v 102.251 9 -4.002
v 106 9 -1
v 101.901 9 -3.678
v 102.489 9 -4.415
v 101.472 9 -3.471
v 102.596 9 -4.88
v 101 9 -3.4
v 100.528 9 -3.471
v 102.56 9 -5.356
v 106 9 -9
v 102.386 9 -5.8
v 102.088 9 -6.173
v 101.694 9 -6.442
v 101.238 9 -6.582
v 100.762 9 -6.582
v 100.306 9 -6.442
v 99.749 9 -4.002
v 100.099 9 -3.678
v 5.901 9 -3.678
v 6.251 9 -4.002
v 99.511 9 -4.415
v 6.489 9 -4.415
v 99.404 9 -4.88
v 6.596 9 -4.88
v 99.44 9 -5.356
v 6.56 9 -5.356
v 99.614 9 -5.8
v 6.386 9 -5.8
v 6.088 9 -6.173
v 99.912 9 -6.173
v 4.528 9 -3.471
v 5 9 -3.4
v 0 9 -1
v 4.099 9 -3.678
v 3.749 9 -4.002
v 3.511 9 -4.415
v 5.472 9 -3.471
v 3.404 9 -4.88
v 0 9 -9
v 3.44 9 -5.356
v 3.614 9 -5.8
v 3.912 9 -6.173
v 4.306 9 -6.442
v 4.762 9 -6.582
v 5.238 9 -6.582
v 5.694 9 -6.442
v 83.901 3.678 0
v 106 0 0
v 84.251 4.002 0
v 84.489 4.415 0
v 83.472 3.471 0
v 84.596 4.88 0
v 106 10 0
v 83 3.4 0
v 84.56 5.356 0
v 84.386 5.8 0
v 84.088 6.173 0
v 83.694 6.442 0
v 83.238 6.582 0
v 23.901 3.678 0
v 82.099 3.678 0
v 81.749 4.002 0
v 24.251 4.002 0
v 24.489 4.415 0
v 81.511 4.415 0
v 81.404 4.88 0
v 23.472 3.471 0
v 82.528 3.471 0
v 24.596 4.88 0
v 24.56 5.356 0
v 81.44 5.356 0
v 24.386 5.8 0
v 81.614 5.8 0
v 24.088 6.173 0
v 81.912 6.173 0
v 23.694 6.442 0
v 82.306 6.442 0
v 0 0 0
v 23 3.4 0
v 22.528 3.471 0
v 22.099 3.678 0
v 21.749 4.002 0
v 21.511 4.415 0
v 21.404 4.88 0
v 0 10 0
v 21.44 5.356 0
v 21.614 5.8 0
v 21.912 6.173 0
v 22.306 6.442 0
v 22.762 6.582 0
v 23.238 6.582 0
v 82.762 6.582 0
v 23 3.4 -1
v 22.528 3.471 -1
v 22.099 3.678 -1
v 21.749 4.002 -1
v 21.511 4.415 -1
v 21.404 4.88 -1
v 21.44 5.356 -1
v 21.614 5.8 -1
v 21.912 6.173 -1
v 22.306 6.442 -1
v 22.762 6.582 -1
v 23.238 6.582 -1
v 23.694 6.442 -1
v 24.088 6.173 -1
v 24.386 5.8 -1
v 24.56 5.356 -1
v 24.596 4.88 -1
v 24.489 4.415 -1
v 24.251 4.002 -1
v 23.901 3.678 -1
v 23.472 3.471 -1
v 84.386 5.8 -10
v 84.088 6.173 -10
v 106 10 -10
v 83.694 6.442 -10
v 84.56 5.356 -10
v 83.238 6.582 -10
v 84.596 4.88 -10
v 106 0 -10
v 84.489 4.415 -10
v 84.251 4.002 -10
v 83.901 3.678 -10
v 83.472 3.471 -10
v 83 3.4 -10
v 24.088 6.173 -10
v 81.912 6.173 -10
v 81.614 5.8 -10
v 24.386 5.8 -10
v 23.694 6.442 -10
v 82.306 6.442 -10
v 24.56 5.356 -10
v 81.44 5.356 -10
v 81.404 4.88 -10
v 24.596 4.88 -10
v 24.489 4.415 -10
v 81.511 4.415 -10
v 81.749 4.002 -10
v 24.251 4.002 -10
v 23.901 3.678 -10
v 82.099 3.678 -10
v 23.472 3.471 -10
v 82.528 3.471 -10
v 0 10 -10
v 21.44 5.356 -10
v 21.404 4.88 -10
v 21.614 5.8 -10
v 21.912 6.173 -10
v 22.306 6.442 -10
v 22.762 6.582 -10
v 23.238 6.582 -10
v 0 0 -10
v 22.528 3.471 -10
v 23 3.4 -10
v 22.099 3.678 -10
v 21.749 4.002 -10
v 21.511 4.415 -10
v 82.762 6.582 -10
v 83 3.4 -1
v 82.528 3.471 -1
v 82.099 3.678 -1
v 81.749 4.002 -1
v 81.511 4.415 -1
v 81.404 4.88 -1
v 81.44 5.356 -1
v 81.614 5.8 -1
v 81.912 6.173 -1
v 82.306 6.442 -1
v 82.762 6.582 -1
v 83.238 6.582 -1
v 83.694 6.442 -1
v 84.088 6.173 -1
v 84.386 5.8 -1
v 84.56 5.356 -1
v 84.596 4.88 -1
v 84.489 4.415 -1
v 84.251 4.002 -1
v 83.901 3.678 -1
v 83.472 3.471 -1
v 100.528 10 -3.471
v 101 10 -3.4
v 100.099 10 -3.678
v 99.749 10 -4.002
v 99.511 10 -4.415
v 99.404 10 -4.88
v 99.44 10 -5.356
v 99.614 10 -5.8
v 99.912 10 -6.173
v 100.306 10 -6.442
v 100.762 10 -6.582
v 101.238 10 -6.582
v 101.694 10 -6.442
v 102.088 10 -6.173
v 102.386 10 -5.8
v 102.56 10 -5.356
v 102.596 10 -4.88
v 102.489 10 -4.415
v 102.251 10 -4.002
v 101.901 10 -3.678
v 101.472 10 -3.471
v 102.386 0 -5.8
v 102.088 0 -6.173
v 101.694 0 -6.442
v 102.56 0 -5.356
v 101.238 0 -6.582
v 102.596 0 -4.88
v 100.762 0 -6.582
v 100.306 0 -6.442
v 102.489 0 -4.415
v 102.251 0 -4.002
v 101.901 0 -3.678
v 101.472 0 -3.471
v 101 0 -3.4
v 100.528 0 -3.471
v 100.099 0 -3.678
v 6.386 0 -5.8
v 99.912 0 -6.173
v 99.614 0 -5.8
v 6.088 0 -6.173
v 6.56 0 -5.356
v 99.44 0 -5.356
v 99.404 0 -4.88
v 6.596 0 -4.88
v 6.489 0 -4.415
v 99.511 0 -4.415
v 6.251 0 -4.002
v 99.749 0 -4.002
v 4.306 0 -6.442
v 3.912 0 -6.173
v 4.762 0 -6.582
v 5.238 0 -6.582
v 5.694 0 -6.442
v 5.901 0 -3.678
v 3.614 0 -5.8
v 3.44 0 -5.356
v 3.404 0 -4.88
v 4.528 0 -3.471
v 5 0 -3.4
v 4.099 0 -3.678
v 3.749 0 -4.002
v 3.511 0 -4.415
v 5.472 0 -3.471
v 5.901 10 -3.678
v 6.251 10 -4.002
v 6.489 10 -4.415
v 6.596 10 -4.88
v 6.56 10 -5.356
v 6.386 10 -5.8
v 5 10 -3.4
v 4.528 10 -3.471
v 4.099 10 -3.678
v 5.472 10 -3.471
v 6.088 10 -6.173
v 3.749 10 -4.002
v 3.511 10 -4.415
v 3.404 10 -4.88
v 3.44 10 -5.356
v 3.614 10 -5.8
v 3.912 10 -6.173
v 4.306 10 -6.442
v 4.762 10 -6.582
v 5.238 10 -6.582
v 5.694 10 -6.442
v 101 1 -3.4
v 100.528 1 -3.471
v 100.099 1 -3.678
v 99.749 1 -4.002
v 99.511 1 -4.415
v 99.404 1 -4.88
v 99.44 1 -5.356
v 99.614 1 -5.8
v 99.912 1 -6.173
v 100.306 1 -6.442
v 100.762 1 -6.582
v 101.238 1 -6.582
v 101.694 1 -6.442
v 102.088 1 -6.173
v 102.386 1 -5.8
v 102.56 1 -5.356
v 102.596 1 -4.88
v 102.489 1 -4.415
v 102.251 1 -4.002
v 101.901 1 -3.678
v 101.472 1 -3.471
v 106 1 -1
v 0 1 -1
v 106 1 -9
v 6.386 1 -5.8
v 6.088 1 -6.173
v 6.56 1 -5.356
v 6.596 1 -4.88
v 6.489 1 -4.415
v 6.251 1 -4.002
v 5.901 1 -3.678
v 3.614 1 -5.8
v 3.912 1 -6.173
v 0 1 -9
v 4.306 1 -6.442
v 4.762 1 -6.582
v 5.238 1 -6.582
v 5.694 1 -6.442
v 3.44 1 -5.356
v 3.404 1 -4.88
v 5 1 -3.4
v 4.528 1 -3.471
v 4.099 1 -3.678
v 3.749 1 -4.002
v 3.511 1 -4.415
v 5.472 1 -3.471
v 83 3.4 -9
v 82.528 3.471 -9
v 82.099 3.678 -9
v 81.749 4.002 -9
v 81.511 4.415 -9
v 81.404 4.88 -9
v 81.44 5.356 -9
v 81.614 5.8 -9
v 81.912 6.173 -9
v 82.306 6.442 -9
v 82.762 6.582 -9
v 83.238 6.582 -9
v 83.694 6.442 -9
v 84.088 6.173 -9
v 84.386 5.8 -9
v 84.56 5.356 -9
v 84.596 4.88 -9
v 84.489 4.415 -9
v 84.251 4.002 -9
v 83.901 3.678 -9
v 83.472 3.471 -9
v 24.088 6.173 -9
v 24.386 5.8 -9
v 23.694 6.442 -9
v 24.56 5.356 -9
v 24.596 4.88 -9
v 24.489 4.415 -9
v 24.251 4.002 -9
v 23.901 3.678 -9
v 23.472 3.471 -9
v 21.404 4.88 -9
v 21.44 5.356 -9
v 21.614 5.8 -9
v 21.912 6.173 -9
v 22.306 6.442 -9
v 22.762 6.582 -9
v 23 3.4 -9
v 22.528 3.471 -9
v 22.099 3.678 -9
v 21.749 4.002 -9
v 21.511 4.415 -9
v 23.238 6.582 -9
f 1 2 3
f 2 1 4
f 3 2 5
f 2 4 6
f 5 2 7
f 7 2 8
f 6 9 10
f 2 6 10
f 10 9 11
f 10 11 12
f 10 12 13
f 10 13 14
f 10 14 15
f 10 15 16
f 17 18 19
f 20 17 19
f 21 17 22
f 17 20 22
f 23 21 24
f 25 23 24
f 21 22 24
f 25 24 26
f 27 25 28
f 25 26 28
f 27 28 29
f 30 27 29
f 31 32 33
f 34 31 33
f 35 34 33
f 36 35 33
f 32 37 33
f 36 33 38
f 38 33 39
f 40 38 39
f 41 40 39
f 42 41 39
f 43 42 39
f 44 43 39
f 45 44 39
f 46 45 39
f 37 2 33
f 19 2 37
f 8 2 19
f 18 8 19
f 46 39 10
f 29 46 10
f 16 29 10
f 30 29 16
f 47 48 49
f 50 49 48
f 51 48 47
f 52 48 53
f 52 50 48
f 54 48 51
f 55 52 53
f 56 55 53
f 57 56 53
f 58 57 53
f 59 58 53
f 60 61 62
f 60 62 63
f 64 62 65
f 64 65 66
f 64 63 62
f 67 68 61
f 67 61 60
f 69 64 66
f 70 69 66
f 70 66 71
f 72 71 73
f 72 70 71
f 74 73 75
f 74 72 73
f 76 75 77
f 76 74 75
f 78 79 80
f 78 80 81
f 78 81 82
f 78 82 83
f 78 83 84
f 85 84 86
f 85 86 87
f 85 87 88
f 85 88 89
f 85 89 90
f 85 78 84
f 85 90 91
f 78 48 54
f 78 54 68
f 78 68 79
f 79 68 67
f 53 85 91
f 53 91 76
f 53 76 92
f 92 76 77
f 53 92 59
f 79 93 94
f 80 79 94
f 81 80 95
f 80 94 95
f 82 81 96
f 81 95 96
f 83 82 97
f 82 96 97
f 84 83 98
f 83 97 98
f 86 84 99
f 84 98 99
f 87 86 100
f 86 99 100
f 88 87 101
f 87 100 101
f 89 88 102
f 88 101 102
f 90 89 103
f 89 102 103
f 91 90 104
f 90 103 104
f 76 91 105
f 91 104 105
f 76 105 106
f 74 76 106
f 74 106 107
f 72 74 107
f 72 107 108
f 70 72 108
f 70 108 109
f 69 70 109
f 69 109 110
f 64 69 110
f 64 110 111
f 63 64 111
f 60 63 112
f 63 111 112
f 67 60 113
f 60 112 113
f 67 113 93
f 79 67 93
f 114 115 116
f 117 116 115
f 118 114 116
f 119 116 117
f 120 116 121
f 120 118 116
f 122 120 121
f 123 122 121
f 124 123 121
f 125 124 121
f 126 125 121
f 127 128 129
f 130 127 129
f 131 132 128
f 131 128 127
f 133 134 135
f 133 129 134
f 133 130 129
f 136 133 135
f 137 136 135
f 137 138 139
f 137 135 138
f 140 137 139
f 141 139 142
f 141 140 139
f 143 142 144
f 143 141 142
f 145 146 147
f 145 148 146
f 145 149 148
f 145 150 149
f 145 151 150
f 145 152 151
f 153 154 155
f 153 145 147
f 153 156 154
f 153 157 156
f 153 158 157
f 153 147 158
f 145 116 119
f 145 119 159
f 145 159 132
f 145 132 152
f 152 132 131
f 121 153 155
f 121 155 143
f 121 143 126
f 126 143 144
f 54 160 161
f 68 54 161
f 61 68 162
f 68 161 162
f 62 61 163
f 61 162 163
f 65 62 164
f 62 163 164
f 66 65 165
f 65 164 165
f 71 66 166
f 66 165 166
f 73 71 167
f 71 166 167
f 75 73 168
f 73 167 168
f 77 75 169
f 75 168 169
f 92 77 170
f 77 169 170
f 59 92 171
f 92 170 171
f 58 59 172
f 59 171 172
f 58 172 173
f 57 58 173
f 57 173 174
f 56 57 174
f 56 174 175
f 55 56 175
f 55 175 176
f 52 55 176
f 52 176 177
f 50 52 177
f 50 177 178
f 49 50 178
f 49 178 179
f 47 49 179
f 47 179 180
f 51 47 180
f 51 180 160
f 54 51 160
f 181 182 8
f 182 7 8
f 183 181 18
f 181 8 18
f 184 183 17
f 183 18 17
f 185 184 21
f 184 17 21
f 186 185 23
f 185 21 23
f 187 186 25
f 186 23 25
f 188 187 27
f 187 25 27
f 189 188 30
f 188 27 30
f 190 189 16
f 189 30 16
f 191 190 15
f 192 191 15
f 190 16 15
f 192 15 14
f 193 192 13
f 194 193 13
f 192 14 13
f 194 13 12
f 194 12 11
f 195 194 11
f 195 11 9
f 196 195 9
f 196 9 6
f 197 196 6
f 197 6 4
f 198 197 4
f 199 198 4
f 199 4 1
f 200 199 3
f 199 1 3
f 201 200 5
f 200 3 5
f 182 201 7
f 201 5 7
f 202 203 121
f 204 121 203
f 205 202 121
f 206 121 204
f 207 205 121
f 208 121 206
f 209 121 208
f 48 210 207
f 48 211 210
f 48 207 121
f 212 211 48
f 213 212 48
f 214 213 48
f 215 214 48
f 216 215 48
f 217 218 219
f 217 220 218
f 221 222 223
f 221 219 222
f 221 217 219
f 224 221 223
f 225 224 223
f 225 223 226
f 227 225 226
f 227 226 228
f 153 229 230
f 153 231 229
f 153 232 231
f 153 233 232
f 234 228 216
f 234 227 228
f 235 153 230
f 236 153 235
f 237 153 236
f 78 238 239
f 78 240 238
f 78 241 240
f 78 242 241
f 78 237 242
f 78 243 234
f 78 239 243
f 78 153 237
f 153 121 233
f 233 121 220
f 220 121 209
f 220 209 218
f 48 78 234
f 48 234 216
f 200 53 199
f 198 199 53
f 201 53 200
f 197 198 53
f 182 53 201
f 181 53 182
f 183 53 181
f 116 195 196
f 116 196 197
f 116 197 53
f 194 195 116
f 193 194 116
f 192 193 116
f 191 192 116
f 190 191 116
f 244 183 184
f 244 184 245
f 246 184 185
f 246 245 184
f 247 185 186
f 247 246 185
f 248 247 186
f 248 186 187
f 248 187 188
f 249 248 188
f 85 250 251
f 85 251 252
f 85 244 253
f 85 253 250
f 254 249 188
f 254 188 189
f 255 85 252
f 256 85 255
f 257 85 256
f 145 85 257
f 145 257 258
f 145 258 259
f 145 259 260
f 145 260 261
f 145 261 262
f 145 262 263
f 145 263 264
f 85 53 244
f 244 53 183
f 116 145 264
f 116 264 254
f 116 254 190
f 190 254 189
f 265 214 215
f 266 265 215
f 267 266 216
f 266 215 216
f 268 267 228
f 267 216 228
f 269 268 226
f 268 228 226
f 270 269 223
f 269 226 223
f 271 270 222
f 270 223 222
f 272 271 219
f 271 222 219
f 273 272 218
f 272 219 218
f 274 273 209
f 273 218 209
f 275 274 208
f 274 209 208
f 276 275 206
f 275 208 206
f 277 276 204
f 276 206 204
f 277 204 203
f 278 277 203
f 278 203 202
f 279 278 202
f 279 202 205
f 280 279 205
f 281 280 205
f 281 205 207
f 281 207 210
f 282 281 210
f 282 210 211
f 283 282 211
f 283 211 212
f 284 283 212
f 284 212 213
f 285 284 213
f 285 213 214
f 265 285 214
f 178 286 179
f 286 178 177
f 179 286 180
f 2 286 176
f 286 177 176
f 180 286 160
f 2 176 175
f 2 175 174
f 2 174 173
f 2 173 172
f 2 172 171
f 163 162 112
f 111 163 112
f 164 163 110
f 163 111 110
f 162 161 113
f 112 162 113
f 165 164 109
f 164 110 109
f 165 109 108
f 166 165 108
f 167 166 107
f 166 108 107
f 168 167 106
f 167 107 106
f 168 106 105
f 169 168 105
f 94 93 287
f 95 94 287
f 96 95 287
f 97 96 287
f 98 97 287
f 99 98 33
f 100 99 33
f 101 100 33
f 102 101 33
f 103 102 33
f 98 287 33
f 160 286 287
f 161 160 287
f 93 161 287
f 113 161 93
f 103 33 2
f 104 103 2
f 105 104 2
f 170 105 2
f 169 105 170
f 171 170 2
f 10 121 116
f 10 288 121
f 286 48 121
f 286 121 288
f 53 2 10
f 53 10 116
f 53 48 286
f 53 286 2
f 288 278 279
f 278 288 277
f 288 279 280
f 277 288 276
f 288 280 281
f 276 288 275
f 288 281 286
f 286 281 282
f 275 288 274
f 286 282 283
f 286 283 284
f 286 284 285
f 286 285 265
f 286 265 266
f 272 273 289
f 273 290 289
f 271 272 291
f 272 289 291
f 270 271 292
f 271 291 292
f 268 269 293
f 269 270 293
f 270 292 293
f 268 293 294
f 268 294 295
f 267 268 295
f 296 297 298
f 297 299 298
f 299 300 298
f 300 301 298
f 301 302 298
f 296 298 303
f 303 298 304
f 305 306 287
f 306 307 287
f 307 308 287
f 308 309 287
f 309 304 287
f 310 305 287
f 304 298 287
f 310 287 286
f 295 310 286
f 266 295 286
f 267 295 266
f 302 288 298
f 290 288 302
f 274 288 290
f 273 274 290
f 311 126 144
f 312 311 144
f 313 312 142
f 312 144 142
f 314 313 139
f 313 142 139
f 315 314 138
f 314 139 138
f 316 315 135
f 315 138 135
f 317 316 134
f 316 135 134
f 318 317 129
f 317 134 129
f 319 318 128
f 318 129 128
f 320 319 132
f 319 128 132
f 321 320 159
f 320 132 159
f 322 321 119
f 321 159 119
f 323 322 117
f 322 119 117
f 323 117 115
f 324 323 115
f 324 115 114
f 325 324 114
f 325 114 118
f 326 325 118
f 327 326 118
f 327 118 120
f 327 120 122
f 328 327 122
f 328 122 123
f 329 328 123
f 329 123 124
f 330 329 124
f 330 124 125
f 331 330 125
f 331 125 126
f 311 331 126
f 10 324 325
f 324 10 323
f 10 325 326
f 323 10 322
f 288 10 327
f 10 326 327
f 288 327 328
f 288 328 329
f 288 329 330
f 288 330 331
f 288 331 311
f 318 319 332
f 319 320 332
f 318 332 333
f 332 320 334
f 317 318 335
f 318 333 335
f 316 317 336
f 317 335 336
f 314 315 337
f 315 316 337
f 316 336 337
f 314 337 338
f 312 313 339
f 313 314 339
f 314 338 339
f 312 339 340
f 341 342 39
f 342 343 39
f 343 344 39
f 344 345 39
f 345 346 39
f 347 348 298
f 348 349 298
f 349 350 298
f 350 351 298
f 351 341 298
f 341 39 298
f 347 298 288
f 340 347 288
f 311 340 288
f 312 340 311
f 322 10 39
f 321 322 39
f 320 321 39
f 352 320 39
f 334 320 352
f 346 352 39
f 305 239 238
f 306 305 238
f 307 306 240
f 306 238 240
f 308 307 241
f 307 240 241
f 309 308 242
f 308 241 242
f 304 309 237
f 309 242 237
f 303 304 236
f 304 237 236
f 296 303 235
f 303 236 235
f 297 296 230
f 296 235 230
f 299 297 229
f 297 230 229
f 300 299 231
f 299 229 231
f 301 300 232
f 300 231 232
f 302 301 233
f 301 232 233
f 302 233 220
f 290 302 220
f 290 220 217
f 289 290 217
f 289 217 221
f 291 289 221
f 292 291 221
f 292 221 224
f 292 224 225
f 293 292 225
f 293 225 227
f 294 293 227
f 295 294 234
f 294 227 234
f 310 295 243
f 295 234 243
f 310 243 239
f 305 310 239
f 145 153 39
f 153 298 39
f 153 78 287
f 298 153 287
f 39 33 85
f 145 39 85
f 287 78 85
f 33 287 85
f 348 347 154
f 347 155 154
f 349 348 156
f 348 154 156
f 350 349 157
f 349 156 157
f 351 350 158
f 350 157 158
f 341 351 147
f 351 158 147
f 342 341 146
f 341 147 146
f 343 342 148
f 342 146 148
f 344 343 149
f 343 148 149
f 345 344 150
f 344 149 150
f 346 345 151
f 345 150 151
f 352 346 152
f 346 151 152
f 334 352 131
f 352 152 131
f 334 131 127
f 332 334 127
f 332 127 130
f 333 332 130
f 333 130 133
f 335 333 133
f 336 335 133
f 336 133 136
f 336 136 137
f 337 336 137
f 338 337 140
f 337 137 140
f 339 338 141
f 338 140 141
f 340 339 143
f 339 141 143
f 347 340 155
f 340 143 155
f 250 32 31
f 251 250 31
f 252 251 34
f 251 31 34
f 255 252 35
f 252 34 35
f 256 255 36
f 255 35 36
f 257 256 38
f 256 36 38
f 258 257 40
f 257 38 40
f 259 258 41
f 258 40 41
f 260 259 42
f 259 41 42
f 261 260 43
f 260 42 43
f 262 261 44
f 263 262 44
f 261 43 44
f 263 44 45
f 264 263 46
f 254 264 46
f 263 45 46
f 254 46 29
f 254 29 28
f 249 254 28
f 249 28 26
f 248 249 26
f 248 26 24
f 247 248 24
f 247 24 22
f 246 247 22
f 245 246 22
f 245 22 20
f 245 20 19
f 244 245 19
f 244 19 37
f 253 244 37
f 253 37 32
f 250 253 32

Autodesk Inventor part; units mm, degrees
ref_plane "YZ Plane" through (0, 0, 0) normal (1, 0, 0) x (0, 1, 0)
ref_plane "XZ Plane" through (0, 0, 0) normal (0, 1, 0) x (-1, 0, 0)
ref_plane "XY Plane" through (0, 0, 0) normal (0, 0, 1) x (1, 0, 0)
sketch "スケッチ1" plane through (0, 0, 0) normal (1, 0, 0) x (0, 1, 0)
  line L0 (0, 0) -> (10, 0)
  line L1 (10, 0) -> (10, -10)
  line L2 (10, -10) -> (0, -10)
  line L3 (0, -10) -> (0, 0)
  line L4 (1, -1) -> (9, -1)
  line L5 (9, -1) -> (9, -9)
  line L6 (9, -9) -> (1, -9)
  line L7 (1, -9) -> (1, -1)
  dimension "d0" = 10
  dimension "d1" = 10
  dimension "d2" = 8
  dimension "d3" = 8
  dimension "d4" = 1
  dimension "d5" = 1
extrude "押し出し1" add sketch "スケッチ1" along normal blind 106
sketch "スケッチ2" plane through (0, 10, 0) normal (0, 1, 0) x (1, 0, 0)
  line L0 (0, 9) -> (0, 1) projected
  line L1 (0, 5) -> (120, 5)
  line L2 (106, 10) -> (106, 0) projected
  point P0 (0, 0)
  point P1 (5, 5)
  point P2 (101, 5)
  dimension "d8" = 5
  dimension "d9" = 5
hole "穴1" at (5, 10, -5) at (101, 10, -5) direction (0, -1, 0) diameter 3.2 end through all
sketch "スケッチ3" plane through (0, 0, 0) normal (0, 0, 1) x (1, 0, 0)
  line L0 (0, 0) -> (0, 10) projected
  line L1 (0, 5) -> (106, 5)
  line L2 (106, 0) -> (106, 10) projected
  point P0 (23, 5)
  point P1 (83, 5)
  point P2 (53, 5)
  dimension "d17" = 30
  dimension "d18" = 30
hole "穴2" at (23, 5, 0) at (83, 5, 0) direction (0, 0, -1) diameter 3.2 end through all
properties part number "link2_pipe3" material "アルミニウム 6061"
